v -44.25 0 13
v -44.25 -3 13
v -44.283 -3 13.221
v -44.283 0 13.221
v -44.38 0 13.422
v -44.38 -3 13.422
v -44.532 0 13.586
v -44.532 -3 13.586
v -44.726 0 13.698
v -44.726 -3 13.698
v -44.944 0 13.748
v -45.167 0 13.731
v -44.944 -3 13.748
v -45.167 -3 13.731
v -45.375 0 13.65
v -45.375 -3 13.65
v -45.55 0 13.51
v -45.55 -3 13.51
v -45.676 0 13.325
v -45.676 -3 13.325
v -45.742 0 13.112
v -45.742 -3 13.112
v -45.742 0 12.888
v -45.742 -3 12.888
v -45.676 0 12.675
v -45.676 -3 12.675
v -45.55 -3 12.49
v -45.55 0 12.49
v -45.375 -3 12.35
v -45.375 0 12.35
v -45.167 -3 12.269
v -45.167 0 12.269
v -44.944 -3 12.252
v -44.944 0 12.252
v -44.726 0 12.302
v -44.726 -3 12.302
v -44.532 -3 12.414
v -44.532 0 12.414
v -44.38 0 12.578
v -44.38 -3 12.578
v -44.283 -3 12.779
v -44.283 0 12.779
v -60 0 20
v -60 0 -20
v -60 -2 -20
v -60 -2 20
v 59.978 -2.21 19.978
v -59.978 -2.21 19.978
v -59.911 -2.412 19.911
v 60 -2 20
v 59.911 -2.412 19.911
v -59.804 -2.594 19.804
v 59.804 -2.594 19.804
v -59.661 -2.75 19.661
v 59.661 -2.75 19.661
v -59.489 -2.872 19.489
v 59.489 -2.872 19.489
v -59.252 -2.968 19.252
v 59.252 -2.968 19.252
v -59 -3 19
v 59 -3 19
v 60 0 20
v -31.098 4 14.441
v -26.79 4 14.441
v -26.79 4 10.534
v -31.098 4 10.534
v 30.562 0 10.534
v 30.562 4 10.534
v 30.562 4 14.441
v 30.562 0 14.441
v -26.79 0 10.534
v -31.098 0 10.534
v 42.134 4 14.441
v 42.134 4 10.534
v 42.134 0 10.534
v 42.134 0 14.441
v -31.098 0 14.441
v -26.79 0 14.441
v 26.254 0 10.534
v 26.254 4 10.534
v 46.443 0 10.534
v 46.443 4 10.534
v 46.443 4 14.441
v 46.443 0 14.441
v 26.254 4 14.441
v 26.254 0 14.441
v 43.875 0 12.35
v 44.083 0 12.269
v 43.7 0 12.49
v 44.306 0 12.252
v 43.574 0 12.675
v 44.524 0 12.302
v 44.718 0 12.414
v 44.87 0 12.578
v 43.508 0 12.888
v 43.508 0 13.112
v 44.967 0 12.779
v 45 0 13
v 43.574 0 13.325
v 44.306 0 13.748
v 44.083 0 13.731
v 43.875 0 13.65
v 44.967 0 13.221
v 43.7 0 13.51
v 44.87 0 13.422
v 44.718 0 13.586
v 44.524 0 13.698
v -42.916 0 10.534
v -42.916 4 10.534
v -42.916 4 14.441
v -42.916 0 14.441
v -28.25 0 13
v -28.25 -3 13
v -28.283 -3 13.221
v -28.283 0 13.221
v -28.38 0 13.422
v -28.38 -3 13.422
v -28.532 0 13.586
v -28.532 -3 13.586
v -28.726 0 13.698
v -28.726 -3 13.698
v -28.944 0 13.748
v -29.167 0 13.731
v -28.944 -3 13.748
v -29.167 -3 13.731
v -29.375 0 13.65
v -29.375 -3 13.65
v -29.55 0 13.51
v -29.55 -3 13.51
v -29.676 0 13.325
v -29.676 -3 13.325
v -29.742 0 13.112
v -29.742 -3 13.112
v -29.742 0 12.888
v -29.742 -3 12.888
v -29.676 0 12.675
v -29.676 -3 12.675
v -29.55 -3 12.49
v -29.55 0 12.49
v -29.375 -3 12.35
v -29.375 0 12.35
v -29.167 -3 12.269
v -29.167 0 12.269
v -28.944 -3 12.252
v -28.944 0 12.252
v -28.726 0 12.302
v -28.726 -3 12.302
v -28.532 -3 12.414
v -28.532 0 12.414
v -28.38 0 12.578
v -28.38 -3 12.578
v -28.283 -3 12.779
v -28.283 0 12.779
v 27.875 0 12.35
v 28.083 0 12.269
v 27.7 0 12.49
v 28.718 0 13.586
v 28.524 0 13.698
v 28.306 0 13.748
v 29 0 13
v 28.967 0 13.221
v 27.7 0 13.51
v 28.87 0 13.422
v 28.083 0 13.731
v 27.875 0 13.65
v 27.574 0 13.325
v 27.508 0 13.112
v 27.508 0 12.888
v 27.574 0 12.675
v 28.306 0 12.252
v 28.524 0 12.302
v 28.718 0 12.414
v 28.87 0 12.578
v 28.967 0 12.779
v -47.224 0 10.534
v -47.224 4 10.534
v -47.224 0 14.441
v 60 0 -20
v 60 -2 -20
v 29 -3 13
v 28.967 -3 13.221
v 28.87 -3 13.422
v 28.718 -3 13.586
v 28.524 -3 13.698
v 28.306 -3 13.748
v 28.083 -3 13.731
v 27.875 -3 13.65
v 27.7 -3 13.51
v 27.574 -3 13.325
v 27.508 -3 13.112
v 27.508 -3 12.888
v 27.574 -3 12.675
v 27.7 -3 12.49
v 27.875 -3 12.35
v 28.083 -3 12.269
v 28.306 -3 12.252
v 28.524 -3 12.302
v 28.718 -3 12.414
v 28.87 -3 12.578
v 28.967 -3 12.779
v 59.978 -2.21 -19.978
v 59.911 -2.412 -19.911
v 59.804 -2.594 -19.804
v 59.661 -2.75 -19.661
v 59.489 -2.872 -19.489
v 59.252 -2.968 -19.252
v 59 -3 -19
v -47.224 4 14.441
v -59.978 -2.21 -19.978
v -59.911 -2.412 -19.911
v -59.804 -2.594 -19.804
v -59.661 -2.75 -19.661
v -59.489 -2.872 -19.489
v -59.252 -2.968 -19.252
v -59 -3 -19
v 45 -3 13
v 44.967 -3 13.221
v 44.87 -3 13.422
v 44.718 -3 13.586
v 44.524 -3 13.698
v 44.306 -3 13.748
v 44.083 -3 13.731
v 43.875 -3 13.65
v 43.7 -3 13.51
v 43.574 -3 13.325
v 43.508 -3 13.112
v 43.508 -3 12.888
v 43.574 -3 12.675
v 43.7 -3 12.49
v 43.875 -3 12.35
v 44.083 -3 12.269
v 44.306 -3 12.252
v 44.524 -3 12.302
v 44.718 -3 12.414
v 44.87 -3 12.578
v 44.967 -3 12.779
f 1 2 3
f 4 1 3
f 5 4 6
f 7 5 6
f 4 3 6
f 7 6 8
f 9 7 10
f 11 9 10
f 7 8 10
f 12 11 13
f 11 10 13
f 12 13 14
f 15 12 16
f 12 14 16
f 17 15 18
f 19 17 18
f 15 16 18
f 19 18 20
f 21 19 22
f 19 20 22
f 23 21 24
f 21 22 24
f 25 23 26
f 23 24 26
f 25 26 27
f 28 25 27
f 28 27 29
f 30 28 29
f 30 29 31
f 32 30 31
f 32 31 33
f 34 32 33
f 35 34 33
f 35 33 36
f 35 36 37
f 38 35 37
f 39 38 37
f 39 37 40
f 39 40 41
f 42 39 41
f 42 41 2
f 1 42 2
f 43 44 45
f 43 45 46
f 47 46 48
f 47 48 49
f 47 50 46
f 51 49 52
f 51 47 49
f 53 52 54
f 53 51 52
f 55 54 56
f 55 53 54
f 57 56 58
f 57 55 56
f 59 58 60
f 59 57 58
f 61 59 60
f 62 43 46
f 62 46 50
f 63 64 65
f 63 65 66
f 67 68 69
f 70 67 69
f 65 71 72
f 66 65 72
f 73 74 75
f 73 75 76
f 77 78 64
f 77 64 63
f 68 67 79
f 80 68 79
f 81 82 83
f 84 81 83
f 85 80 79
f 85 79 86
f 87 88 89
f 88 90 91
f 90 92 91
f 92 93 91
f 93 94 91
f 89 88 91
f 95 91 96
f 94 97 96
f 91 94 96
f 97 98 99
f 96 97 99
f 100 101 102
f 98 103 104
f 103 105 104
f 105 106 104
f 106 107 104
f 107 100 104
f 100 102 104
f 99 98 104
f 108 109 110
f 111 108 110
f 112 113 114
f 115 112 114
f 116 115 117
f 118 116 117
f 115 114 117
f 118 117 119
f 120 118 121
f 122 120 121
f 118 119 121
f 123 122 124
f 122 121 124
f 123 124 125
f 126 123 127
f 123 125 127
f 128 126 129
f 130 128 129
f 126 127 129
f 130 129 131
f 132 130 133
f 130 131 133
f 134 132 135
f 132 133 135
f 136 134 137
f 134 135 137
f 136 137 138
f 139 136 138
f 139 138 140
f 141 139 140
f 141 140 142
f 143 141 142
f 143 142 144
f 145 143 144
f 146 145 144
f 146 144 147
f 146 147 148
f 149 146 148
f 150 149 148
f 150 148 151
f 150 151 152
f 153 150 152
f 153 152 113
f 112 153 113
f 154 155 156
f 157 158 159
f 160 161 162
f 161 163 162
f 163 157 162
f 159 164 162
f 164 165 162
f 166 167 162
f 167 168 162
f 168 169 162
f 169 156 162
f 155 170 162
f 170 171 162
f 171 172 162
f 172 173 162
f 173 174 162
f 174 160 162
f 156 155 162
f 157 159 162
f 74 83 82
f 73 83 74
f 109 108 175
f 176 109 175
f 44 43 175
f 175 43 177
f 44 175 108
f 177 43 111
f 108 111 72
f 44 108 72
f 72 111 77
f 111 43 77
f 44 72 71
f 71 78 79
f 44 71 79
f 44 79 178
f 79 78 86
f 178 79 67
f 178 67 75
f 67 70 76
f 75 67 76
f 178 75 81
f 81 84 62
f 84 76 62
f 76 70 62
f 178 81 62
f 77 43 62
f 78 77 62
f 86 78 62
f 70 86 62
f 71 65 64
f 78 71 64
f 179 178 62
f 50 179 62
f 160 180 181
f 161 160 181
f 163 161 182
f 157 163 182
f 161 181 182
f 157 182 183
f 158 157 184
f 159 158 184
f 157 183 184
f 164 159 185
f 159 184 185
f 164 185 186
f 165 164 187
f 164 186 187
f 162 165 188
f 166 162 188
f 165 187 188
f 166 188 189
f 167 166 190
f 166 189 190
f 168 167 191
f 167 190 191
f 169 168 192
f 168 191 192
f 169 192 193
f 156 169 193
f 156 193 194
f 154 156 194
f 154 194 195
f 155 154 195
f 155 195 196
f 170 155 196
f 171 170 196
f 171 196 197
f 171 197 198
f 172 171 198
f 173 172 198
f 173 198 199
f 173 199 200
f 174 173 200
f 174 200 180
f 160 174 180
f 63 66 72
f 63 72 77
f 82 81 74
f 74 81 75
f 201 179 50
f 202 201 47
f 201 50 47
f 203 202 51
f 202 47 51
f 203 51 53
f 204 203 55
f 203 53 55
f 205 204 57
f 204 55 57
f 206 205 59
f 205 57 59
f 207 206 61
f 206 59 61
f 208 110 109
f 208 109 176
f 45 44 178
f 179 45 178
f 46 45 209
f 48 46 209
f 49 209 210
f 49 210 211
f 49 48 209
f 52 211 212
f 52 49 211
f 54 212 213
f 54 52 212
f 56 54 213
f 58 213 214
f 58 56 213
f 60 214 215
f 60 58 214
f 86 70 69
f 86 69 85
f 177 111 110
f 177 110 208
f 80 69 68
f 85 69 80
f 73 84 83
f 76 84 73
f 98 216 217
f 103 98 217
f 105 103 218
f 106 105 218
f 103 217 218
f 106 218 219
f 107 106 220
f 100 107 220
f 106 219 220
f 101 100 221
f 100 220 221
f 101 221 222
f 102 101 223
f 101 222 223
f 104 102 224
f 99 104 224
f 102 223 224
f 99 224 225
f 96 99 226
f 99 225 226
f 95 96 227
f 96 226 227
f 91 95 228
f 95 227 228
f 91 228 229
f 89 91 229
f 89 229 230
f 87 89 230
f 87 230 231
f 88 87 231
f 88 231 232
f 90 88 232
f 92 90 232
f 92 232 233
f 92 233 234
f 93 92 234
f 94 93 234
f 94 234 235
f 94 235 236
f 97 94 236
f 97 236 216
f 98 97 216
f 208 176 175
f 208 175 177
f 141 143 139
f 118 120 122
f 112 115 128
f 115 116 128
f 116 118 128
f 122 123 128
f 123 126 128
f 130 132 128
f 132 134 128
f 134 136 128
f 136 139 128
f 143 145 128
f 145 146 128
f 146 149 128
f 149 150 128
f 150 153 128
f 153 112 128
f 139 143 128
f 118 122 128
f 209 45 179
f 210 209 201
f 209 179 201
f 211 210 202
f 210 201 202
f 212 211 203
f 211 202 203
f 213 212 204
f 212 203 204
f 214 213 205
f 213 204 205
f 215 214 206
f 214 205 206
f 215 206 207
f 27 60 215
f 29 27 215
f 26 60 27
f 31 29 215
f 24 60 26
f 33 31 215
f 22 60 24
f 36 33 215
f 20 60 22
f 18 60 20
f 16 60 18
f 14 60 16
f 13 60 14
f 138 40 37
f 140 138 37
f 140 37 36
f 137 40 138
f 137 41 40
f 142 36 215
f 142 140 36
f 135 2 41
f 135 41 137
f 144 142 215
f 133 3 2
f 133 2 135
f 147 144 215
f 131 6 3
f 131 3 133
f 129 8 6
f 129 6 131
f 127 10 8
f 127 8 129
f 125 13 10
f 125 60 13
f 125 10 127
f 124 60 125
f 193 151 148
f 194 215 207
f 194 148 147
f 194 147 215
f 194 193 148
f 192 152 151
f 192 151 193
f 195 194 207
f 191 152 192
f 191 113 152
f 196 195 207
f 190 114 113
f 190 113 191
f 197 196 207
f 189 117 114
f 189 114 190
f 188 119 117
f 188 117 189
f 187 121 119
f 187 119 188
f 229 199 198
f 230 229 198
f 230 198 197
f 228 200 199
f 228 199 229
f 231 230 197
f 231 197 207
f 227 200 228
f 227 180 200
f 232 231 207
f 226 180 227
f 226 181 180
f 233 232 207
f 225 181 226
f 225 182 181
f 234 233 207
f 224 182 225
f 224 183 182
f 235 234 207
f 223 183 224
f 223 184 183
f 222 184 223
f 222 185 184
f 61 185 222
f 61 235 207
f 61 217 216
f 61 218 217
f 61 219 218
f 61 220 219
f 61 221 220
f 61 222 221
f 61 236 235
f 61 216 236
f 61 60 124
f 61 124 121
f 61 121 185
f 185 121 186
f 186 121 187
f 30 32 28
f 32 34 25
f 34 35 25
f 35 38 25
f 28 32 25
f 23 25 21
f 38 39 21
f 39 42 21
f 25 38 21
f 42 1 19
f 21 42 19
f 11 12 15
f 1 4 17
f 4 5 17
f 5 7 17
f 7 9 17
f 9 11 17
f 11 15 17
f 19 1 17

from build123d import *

# Parameters (mm, degrees)
F0_W     = 120
F0_H     = 40
F1_DEPTH = 3
F2_R     = 1
F3_R     = 0.75
F4_DEPTH = 5.9
F5_W     = 4.308377
F5_H     = 3.907596
F5_W_2   = 4.308376
F6_DEPTH = 4


with BuildPart() as f1:
    # F0 (on Front) → F1 (new body)
    with BuildSketch(Plane.XZ):
        Rectangle(F0_W, F0_H)
    extrude(amount=F1_DEPTH)

    # F2
    f2_edges = [f1.edges().sort_by_distance(p)[0] for p in [
        (0, -3, 20),
        (-60, -3, 0),
        (0, -3, -20),
        (60, -3, 0),
    ]]
    fillet(f2_edges, radius=F2_R)

    # F3 (on face) → F4 (cut)
    with BuildSketch(Plane.XZ.offset(3)):
        with Locations((-45, 13)):
            Circle(F3_R)
        with Locations((-29, 13)):
            Circle(F3_R)
        with Locations((28.25, 13)):
            Circle(F3_R)
        with Locations((44.25, 13)):
            Circle(F3_R)
    extrude(amount=-F4_DEPTH, mode=Mode.SUBTRACT)

    # F5 (on face) → F6 (join)
    with BuildSketch(Plane(origin=(0, 0, 0), x_dir=(-1, 0, 0), z_dir=(0, 1, 0))):
        with Locations((-44.288592, 12.487537)):
            Rectangle(F5_W, F5_H)
        with Locations((-28.407722, 12.487537)):
            Rectangle(F5_W, F5_H)
        with Locations((28.944263, 12.487537)):
            Rectangle(F5_W_2, F5_H)
        with Locations((45.069936, 12.487537)):
            Rectangle(F5_W, F5_H)
    extrude(amount=F6_DEPTH)


solid = f1.part
